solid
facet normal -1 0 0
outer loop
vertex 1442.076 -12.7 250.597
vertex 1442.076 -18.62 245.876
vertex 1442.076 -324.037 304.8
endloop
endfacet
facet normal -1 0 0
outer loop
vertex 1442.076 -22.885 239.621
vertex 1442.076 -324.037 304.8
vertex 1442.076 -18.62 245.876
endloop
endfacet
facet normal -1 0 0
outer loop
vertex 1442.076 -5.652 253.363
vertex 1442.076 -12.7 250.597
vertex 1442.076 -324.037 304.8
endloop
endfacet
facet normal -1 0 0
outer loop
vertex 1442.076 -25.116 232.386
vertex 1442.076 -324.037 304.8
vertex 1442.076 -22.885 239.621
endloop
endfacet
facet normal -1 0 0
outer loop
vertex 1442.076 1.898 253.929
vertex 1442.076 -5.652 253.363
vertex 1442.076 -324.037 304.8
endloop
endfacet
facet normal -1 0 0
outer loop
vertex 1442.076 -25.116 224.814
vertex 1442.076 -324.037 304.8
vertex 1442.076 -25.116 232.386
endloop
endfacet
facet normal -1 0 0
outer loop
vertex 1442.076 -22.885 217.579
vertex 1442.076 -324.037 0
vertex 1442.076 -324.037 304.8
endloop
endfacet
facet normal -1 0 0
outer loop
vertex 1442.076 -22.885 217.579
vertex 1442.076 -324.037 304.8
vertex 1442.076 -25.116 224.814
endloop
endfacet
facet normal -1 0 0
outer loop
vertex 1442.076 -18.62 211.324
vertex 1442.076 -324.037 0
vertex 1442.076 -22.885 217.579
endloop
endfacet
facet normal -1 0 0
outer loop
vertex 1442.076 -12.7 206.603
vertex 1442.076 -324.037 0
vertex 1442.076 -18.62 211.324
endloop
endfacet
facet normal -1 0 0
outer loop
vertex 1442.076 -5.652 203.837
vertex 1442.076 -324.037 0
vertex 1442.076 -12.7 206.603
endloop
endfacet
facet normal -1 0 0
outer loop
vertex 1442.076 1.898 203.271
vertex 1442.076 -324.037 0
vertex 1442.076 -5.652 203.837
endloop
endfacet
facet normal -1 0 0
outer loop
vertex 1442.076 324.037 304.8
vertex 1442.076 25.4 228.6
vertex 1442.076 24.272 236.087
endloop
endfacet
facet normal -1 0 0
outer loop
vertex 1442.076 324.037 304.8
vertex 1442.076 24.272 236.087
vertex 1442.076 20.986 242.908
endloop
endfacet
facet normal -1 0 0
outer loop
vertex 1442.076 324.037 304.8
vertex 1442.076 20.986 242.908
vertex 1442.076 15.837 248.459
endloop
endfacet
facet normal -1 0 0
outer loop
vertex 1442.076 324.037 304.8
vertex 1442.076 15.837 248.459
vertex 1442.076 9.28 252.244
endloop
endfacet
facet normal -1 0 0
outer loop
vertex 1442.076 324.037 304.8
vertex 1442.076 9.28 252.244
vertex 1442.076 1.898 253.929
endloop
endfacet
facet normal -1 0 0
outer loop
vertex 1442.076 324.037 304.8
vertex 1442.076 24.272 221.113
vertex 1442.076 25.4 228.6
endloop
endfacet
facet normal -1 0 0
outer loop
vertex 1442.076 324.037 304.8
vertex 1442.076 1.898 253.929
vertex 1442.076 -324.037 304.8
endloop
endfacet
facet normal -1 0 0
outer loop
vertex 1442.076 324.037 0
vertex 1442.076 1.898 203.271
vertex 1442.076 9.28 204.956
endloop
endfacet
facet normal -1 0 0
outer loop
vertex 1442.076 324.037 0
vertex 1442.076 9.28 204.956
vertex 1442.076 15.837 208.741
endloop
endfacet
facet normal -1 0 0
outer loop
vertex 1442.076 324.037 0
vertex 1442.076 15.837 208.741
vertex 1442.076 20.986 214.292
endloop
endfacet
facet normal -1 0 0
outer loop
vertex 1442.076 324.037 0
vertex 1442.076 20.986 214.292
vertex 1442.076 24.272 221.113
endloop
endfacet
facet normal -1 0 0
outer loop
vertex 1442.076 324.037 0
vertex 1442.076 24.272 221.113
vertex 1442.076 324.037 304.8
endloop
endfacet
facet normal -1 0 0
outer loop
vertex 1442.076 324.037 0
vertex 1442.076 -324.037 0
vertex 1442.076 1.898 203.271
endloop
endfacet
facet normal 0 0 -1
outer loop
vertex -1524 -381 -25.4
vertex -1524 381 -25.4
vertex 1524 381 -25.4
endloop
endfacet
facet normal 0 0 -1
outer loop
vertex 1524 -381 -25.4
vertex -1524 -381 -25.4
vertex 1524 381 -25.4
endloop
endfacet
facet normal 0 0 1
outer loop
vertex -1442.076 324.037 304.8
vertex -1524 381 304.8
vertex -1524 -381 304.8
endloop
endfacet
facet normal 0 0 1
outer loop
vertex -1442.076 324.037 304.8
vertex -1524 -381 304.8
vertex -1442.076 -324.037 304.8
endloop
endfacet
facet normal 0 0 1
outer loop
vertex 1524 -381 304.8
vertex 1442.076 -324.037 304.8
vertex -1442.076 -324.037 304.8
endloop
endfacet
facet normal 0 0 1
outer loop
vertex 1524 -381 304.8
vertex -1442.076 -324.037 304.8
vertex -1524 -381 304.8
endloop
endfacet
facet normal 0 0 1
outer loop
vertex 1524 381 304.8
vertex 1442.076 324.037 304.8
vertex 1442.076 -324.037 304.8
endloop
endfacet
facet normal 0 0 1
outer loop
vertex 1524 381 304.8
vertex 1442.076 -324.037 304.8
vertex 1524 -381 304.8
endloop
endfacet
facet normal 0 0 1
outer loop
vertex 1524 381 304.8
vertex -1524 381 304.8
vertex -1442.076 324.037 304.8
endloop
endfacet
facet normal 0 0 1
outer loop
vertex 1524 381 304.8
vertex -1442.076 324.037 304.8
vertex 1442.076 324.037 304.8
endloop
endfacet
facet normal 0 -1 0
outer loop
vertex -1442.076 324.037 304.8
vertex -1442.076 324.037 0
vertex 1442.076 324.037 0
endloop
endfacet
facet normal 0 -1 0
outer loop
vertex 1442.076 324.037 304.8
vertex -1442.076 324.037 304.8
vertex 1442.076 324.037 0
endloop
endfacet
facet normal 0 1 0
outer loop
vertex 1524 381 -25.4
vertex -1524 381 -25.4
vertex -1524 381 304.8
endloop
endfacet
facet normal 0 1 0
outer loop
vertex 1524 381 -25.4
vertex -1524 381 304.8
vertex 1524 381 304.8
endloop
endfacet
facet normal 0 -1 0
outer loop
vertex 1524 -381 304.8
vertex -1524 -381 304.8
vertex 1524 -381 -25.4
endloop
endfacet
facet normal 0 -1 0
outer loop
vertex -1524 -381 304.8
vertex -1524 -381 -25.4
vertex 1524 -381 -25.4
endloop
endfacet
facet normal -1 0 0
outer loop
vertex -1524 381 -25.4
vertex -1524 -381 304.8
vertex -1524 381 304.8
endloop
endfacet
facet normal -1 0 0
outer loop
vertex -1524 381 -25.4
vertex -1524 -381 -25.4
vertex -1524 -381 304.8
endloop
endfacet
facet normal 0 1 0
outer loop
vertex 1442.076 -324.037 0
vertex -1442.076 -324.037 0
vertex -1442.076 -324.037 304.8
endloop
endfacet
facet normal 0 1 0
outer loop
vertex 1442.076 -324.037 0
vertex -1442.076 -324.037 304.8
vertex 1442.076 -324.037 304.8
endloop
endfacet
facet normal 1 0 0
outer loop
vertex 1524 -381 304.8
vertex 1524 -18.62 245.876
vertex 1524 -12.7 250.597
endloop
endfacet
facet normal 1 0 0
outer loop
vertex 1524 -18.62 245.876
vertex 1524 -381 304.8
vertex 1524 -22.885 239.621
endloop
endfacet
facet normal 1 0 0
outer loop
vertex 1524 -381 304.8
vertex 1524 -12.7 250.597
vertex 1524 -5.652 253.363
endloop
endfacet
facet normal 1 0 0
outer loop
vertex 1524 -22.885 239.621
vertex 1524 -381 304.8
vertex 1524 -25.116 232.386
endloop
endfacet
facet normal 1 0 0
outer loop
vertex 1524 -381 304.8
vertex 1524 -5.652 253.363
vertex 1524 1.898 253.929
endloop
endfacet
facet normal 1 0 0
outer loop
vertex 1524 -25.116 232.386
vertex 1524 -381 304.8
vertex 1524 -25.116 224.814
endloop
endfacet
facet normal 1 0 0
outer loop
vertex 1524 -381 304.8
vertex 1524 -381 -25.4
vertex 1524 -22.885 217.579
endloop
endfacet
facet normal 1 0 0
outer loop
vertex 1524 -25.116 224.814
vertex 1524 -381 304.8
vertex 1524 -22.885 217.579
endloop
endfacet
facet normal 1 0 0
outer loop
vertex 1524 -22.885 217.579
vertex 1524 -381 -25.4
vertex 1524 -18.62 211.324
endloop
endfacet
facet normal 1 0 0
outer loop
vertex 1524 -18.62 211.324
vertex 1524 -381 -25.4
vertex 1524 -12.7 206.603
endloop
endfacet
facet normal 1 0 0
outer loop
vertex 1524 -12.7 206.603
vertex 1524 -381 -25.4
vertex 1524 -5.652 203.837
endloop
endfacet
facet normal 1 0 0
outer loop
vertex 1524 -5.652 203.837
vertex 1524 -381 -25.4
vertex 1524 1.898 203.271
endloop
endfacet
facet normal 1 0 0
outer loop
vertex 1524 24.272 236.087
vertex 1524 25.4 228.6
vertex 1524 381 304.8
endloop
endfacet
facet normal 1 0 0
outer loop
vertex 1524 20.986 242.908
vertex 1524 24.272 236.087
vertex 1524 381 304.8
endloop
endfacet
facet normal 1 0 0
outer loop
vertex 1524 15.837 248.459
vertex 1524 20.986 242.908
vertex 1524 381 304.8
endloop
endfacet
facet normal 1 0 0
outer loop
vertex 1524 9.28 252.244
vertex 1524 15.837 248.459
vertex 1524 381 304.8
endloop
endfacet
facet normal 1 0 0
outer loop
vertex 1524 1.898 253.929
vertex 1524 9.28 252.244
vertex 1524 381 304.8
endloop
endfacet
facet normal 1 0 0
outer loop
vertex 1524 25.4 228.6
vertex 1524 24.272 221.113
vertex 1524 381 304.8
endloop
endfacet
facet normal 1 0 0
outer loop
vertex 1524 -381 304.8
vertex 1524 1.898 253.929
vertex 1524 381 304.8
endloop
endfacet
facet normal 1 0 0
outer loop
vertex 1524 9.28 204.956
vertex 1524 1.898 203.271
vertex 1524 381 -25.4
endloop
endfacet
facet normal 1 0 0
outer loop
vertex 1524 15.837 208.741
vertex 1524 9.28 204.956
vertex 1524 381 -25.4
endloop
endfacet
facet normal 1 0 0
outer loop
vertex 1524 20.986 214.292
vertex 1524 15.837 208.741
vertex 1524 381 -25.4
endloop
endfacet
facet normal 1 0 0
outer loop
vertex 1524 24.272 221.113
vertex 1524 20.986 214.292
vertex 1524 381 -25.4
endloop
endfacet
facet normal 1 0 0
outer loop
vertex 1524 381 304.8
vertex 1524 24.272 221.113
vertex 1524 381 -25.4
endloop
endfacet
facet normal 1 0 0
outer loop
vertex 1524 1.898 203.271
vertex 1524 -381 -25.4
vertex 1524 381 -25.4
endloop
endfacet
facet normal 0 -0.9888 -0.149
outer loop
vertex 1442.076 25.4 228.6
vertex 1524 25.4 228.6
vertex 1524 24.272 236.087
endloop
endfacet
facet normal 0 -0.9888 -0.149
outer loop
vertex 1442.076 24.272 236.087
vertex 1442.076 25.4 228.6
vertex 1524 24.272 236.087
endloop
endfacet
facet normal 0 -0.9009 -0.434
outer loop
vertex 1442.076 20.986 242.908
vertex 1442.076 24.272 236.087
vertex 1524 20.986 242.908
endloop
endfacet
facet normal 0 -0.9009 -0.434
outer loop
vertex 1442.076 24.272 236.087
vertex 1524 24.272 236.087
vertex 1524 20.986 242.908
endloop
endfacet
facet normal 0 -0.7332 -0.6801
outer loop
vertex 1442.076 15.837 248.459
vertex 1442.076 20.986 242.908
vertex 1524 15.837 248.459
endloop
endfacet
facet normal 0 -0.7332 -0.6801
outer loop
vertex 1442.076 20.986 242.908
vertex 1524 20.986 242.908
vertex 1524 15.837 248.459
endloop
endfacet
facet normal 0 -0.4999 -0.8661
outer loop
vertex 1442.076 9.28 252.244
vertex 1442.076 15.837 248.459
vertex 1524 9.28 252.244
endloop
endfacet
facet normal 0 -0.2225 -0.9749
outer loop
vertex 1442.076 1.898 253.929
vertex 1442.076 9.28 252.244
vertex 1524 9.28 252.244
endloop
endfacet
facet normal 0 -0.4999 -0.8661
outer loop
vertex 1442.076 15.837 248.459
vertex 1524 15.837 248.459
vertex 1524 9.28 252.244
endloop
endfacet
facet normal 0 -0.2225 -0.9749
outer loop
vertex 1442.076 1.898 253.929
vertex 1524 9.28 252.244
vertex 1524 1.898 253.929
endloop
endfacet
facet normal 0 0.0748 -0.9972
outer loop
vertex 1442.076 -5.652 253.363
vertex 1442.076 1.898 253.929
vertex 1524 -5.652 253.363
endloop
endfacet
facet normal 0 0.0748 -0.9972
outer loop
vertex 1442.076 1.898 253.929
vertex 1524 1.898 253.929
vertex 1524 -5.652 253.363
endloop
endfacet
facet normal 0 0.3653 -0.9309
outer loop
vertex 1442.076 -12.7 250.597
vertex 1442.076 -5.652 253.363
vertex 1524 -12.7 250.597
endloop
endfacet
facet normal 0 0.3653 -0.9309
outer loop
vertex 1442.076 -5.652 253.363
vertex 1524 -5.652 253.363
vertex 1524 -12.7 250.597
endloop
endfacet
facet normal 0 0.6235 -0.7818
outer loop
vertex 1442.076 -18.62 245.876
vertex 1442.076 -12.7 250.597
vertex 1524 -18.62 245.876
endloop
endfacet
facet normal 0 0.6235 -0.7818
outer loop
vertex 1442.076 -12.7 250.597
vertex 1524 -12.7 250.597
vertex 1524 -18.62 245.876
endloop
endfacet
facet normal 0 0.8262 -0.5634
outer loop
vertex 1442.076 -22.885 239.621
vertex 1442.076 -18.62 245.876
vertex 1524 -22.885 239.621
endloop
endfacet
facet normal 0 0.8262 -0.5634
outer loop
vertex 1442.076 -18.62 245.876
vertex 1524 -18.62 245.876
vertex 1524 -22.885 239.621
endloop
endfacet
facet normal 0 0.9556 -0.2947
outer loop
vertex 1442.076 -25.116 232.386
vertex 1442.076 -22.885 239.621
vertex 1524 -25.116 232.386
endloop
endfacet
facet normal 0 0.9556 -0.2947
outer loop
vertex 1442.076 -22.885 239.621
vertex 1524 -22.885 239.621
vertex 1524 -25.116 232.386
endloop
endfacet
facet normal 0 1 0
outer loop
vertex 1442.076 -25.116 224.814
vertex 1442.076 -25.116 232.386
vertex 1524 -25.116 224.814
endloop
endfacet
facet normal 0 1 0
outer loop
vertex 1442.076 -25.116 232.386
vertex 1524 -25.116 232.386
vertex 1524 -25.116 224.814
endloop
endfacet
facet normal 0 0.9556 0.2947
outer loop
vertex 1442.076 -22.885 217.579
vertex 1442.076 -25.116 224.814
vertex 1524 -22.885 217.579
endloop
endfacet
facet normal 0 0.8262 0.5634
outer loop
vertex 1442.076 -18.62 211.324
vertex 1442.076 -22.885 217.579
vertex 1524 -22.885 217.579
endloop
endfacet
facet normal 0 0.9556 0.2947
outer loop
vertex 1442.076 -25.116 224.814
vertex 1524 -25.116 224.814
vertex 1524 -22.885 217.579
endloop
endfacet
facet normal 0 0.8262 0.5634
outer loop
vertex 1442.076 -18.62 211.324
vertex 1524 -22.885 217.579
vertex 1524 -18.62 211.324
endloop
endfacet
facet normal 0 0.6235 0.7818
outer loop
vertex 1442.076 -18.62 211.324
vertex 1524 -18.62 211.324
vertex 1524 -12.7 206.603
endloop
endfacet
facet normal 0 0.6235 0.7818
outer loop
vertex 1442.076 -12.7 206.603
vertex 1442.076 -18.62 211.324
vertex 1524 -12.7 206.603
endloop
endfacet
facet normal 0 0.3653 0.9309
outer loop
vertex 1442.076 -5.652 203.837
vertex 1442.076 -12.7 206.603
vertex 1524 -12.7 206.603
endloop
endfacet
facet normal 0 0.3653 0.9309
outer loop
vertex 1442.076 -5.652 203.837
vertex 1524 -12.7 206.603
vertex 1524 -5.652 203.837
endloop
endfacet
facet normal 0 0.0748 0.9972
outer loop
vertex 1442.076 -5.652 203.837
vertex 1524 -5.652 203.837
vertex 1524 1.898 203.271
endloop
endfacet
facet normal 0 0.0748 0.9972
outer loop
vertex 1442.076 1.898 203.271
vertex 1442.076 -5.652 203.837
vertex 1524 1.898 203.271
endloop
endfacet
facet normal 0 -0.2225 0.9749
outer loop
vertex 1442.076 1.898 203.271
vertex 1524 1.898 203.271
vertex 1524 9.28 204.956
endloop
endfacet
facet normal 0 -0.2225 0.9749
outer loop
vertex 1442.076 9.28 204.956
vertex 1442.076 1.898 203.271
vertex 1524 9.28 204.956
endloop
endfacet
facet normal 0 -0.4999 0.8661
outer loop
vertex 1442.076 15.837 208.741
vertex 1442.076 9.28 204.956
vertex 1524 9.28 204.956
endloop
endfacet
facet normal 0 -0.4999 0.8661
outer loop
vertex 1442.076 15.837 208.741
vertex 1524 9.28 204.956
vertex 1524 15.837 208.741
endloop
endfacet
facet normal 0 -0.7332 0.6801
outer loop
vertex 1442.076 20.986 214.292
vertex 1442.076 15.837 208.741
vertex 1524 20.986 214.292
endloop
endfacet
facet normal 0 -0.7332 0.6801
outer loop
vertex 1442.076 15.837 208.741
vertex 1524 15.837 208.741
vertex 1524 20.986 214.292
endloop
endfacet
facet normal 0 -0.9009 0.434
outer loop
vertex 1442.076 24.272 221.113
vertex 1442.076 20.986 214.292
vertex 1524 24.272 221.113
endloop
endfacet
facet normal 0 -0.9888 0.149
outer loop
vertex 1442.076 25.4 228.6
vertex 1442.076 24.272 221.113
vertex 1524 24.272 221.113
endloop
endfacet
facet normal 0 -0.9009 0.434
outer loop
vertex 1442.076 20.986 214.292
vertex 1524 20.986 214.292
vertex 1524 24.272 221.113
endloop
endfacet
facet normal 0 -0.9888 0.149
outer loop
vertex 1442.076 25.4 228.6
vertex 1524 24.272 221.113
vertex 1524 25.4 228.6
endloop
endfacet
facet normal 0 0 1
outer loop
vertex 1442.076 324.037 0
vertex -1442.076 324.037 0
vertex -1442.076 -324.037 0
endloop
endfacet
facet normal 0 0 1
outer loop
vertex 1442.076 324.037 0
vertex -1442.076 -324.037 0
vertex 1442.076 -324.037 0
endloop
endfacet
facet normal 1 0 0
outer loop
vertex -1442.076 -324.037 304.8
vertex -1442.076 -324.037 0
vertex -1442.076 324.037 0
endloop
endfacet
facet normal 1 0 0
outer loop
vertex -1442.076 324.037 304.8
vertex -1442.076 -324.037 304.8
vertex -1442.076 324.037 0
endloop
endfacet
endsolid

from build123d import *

# Parameters (mm, degrees)
F0_W     = 3048
F0_H     = 762
F0_W_2   = 2884.152173996
F0_H_2   = 648.0749249458
F1_DEPTH = 25.4
F2_DEPTH = 304.8
F3_R     = 25.4
F4_DEPTH = 81.923913002


with BuildPart() as f1:
    # F0 (on Top) → F1 (new body)
    with BuildSketch(Plane.XY):
        Rectangle(F0_W, F0_H)
        Rectangle(F0_W_2, F0_H_2, mode=Mode.SUBTRACT)
        Rectangle(F0_W_2, F0_H_2)
    extrude(amount=-F1_DEPTH)

    # F0 (on Top) → F2 (join)
    with BuildSketch(Plane.XY):
        Rectangle(F0_W, F0_H)
        Rectangle(F0_W_2, F0_H_2, mode=Mode.SUBTRACT)
    extrude(amount=F2_DEPTH)

    # F3 (on face) → F4 (cut, through all)
    with BuildSketch(Plane.YZ.offset(1524)):
        with Locations((0, 228.6)):
            Circle(F3_R)
    extrude(amount=-F4_DEPTH, mode=Mode.SUBTRACT)


solid = f1.part
